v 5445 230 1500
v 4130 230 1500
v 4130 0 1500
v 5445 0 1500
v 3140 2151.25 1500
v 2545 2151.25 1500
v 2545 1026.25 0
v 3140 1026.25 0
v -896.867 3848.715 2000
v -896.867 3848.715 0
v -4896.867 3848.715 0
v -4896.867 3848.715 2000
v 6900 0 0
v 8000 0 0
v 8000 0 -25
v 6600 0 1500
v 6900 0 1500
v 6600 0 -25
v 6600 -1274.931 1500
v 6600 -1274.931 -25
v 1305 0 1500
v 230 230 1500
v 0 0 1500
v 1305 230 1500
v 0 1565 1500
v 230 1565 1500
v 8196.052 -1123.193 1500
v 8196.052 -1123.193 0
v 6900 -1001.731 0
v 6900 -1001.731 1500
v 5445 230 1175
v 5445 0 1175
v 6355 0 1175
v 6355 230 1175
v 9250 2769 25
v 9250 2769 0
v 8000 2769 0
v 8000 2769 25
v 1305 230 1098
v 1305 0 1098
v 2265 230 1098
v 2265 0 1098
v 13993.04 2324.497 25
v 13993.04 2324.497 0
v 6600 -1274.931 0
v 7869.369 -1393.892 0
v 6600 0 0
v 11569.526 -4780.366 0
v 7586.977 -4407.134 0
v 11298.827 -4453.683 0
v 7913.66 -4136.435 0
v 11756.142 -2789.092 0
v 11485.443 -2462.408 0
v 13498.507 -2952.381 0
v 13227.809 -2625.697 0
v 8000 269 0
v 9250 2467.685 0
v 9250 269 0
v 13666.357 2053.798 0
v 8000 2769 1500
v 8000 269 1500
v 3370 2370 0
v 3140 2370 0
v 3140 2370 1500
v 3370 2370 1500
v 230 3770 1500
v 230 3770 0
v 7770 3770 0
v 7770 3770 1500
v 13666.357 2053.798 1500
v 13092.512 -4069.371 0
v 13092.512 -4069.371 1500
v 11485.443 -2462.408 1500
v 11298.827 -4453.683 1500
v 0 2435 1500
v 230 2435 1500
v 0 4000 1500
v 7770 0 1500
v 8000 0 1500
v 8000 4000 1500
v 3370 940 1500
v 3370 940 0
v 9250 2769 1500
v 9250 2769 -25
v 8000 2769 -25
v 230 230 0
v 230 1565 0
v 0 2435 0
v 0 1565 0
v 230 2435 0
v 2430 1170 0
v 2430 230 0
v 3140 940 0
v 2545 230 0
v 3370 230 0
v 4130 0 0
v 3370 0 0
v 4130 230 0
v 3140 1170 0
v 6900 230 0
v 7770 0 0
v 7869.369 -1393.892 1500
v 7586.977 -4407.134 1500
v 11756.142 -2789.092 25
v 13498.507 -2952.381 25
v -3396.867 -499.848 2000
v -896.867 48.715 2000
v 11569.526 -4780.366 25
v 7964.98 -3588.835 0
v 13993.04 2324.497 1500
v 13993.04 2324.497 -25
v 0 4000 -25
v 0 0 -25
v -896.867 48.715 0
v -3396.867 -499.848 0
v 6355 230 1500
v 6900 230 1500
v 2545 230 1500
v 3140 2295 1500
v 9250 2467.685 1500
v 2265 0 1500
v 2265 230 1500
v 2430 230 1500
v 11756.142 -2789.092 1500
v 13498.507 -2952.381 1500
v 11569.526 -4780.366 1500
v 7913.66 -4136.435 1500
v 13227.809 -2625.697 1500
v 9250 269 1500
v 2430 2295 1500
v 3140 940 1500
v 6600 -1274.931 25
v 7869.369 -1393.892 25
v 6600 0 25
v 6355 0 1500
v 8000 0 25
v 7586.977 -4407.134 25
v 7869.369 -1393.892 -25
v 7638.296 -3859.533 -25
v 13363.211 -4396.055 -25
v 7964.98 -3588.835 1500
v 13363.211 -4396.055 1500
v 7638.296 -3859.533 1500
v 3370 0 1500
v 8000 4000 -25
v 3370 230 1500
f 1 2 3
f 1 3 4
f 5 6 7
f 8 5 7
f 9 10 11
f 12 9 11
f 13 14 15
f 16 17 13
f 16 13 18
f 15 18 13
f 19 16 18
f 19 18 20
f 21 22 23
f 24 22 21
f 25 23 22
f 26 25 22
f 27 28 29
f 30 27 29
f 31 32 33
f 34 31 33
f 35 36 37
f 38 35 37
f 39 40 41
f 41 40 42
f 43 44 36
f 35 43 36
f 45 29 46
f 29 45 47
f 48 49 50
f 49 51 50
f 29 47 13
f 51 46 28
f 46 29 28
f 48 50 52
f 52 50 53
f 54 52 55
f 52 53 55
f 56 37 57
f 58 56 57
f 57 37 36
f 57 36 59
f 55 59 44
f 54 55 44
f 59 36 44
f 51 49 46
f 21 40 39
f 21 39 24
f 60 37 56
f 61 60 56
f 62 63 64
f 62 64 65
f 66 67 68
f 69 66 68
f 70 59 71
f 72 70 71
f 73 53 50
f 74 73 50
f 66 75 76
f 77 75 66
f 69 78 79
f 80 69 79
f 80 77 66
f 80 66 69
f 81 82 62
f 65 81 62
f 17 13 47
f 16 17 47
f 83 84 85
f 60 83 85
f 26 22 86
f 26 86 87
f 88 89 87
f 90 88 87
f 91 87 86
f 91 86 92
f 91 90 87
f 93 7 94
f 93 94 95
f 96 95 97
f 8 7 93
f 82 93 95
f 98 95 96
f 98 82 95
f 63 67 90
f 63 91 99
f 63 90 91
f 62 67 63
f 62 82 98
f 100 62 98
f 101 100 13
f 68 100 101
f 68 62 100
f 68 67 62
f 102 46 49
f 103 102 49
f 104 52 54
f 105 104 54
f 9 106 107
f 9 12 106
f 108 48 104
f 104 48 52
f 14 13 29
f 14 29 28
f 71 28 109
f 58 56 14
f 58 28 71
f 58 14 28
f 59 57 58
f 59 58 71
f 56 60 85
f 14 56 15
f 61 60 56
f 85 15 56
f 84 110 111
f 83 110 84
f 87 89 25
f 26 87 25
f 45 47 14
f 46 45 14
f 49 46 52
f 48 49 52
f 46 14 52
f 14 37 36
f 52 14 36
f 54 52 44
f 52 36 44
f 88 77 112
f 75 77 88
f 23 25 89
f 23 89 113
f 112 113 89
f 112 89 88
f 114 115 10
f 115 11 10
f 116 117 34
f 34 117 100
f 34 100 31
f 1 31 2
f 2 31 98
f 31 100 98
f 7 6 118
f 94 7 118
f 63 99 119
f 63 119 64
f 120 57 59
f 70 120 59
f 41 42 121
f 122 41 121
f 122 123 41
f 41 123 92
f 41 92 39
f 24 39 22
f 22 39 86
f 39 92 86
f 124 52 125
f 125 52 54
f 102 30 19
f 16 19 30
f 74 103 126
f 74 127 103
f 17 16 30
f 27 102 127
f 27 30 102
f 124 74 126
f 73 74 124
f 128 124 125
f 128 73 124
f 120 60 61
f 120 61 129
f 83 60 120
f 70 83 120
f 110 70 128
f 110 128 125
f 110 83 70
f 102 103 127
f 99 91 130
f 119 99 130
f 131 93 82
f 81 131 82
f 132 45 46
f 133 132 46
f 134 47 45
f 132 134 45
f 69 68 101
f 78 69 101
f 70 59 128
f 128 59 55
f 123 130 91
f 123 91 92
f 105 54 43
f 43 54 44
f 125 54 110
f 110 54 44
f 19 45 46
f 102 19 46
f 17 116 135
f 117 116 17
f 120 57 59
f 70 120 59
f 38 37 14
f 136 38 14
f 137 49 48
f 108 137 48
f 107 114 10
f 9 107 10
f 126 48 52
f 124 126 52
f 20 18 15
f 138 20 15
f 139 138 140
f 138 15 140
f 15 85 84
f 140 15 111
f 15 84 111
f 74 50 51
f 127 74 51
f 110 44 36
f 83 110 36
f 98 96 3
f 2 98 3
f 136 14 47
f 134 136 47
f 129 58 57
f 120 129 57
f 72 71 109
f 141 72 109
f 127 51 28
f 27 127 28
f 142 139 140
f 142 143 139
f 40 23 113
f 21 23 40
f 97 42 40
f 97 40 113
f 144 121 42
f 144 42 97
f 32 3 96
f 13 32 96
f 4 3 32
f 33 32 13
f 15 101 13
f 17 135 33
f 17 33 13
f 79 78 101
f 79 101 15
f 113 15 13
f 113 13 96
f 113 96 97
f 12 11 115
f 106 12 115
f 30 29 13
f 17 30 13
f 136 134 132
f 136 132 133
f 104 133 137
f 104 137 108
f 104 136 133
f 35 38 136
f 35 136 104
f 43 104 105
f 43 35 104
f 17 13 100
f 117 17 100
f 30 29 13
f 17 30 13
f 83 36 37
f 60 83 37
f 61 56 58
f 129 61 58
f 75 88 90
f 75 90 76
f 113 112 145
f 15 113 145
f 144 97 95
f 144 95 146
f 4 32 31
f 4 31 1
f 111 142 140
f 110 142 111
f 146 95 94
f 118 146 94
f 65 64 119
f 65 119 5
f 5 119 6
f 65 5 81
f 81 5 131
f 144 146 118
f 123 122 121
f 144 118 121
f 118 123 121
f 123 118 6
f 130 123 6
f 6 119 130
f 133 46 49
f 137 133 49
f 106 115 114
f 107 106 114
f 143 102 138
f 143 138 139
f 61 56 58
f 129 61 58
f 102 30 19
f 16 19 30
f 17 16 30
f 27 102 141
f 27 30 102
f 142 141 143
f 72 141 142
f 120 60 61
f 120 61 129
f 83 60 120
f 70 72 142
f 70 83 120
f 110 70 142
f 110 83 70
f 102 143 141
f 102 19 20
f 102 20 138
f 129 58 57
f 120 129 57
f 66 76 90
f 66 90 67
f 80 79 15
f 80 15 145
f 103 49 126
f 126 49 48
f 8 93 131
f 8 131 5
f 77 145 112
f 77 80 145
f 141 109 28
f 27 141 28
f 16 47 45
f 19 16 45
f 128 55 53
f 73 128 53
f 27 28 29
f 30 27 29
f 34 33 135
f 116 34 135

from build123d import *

# Parameters (mm, degrees)
F4_DEPTH  = 1500
F5_DEPTH  = 1500
F3_W      = 230
F3_H      = 1430
F6_W      = 760
F6_H      = 1500
F6_W_2    = 910
F6_H_2    = 325
F6_W_3    = 960
F6_H_3    = 402
F7_DEPTH  = 230
F8_DEPTH  = 25
F10_DEPTH = 25
F12_DEPTH = 115
F14_DEPTH = 595
F15_W     = 870
F15_H     = 1500
F16_DEPTH = 230
F18_DEPTH = 25
F20_DEPTH = 1500
F22_DEPTH = 2000


with BuildPart() as f4:
    # F2 (on Top) → F4 (new body)
    with BuildSketch(Plane.XY):
        Polygon((9250, 269), (9250, 2467.6854490471), (13666.3567495496, 2053.7978043052), (13092.5117789977, -4069.3714690182), (7964.9797858895, -3588.8346237594), (8196.0522462423, -1123.1934458246), (6900, -1001.7313352933), (6900, 0), (6600, 0), (6600, -1274.9307903732), (7869.3686245898, -1393.8921923013), (7638.296164237, -3859.533370236), (13363.2105254744, -4396.0550906707), (13993.040371202, 2324.4965507819), (9250, 2769), (8000, 2769), (8000, 269), align=None)
    extrude(amount=F4_DEPTH)

    # F1 (on Top) → F10 (join)
    with BuildSketch(Plane.XY):
        Polygon((13993.040371202, 2324.4965507819), (9250, 2769), (8000, 2769), (8000, 0), (6600, 0), (6600, -1274.9307903732), (7869.3686245898, -1393.8921923013), (7638.296164237, -3859.533370236), (13363.2105254744, -4396.0550906707), align=None)
    extrude(amount=-F10_DEPTH)


with BuildPart() as f5:
    # F3 (on Top) → F5 (new body)
    with BuildSketch(Plane.XY):
        Polygon((8000, 4000), (0, 4000), (0, 0), (6900, 0), (6900, 230), (2545, 230), (2545, 1170), (2430, 1170), (2430, 230), (230, 230), (230, 3770), (7770, 3770), (7770, 0), (8000, 0), (8000, 269), (8000, 2769), (8000, 3790), align=None)
    extrude(amount=F5_DEPTH)

    # F6 (on face) → F7 (cut, through all)
    with BuildSketch(Plane.XZ):
        with Locations((3750, 750)):
            Rectangle(F6_W, F6_H)
        with Locations((5900, 1337.5)):
            Rectangle(F6_W_2, F6_H_2)
        with Locations((1785, 1299)):
            Rectangle(F6_W_3, F6_H_3)
    extrude(amount=-F7_DEPTH, mode=Mode.SUBTRACT)



with BuildPart() as f5b:
    # F3 (on Top) → F5, piece 2 (new body)
    with BuildSketch(Plane.XY):
        with Locations((3255, 1655)):
            Rectangle(F3_W, F3_H)
    extrude(amount=F5_DEPTH)


with BuildPart() as f5_1:
    add(f5.part)

    add(f5b.part)  # F8 merges F5b
    # F0 (on Top) → F8 (join)
    with BuildSketch(Plane.XY):
        Polygon((0, 4000), (0, 0), (8000, 0), (8000, 269), (8000, 2769), (8000, 3790), (8000, 4000), align=None)
    extrude(amount=-F8_DEPTH)

    # F9: union 

    # F11 (on face) → F12 (join, through all)
    with BuildSketch(Plane(origin=(2430, 0, 0), x_dir=(0, -1, 0), z_dir=(-1, 0, 0))):
        Polygon((-2295, 1500), (-1170, 0), (-1170, 1500), align=None)
    extrude(amount=-F12_DEPTH)

    # F13 (on face) → F14 (join, through all)
    with BuildSketch(Plane.YZ.offset(2545)):
        Polygon((1170, 0), (2295, 1500), (2151.25, 1500), (1026.25, 0), align=None)
    extrude(amount=F14_DEPTH)

    # F15 (on face) → F16 (cut)
    with BuildSketch(Plane(origin=(0, 0, 0), x_dir=(0, -1, 0), z_dir=(-1, 0, 0))):
        with Locations((-2000, 750)):
            Rectangle(F15_W, F15_H)
    extrude(amount=-F16_DEPTH, mode=Mode.SUBTRACT)


with BuildPart() as f18:
    # F17 (on Top) → F18 (new body)
    with BuildSketch(Plane.XY):
        Polygon((13993.0403712021, 2324.4965507819), (9250, 2769), (8000, 2769), (8000, 269), (8000, 0), (6600, 0), (6600, -1274.9307903732), (7869.3686245898, -1393.8921923013), (7586.9766953259, -4407.1338743544), (11569.5258161867, -4780.3663755263), (11756.1420667726, -2789.0918150959), (13498.5073071492, -2952.3810343586), align=None)
    extrude(amount=F18_DEPTH)


with BuildPart() as f20:
    # F19 (on Top) → F20 (new body)
    with BuildSketch(Plane.XY):
        Polygon((6900, -1001.7313352933), (6900, 0), (6600, 0), (6600, -1274.9307903732), (7869.3686245898, -1393.8921923013), (7586.9766953259, -4407.1338743544), (11569.5258161867, -4780.3663755263), (11756.1420667726, -2789.0918150959), (13498.5073071492, -2952.3810343586), (13993.0403712021, 2324.4965507819), (9250, 2769), (8000, 2769), (8000, 269), (9250, 269), (9250, 2467.6854490471), (13666.3567495496, 2053.7978043052), (13227.8085606726, -2625.6974127062), (11485.443320296, -2462.4081934435), (11298.82706971, -4453.6827538739), (7913.6603169784, -4136.4351278777), (8196.0522462423, -1123.1934458246), align=None)
    extrude(amount=F20_DEPTH)


with BuildPart() as f22:
    # F21 (on Top) → F22 (new body)
    with BuildSketch(Plane.XY):
        Polygon((-3396.867229657, -499.8484626007), (-896.867229657, 48.7145184311), (-896.867229657, 3848.7145184311), (-4896.867229657, 3848.7145184311), align=None)
    extrude(amount=F22_DEPTH)


solid = Compound([f4.part, f5_1.part, f18.part, f20.part, f22.part])
